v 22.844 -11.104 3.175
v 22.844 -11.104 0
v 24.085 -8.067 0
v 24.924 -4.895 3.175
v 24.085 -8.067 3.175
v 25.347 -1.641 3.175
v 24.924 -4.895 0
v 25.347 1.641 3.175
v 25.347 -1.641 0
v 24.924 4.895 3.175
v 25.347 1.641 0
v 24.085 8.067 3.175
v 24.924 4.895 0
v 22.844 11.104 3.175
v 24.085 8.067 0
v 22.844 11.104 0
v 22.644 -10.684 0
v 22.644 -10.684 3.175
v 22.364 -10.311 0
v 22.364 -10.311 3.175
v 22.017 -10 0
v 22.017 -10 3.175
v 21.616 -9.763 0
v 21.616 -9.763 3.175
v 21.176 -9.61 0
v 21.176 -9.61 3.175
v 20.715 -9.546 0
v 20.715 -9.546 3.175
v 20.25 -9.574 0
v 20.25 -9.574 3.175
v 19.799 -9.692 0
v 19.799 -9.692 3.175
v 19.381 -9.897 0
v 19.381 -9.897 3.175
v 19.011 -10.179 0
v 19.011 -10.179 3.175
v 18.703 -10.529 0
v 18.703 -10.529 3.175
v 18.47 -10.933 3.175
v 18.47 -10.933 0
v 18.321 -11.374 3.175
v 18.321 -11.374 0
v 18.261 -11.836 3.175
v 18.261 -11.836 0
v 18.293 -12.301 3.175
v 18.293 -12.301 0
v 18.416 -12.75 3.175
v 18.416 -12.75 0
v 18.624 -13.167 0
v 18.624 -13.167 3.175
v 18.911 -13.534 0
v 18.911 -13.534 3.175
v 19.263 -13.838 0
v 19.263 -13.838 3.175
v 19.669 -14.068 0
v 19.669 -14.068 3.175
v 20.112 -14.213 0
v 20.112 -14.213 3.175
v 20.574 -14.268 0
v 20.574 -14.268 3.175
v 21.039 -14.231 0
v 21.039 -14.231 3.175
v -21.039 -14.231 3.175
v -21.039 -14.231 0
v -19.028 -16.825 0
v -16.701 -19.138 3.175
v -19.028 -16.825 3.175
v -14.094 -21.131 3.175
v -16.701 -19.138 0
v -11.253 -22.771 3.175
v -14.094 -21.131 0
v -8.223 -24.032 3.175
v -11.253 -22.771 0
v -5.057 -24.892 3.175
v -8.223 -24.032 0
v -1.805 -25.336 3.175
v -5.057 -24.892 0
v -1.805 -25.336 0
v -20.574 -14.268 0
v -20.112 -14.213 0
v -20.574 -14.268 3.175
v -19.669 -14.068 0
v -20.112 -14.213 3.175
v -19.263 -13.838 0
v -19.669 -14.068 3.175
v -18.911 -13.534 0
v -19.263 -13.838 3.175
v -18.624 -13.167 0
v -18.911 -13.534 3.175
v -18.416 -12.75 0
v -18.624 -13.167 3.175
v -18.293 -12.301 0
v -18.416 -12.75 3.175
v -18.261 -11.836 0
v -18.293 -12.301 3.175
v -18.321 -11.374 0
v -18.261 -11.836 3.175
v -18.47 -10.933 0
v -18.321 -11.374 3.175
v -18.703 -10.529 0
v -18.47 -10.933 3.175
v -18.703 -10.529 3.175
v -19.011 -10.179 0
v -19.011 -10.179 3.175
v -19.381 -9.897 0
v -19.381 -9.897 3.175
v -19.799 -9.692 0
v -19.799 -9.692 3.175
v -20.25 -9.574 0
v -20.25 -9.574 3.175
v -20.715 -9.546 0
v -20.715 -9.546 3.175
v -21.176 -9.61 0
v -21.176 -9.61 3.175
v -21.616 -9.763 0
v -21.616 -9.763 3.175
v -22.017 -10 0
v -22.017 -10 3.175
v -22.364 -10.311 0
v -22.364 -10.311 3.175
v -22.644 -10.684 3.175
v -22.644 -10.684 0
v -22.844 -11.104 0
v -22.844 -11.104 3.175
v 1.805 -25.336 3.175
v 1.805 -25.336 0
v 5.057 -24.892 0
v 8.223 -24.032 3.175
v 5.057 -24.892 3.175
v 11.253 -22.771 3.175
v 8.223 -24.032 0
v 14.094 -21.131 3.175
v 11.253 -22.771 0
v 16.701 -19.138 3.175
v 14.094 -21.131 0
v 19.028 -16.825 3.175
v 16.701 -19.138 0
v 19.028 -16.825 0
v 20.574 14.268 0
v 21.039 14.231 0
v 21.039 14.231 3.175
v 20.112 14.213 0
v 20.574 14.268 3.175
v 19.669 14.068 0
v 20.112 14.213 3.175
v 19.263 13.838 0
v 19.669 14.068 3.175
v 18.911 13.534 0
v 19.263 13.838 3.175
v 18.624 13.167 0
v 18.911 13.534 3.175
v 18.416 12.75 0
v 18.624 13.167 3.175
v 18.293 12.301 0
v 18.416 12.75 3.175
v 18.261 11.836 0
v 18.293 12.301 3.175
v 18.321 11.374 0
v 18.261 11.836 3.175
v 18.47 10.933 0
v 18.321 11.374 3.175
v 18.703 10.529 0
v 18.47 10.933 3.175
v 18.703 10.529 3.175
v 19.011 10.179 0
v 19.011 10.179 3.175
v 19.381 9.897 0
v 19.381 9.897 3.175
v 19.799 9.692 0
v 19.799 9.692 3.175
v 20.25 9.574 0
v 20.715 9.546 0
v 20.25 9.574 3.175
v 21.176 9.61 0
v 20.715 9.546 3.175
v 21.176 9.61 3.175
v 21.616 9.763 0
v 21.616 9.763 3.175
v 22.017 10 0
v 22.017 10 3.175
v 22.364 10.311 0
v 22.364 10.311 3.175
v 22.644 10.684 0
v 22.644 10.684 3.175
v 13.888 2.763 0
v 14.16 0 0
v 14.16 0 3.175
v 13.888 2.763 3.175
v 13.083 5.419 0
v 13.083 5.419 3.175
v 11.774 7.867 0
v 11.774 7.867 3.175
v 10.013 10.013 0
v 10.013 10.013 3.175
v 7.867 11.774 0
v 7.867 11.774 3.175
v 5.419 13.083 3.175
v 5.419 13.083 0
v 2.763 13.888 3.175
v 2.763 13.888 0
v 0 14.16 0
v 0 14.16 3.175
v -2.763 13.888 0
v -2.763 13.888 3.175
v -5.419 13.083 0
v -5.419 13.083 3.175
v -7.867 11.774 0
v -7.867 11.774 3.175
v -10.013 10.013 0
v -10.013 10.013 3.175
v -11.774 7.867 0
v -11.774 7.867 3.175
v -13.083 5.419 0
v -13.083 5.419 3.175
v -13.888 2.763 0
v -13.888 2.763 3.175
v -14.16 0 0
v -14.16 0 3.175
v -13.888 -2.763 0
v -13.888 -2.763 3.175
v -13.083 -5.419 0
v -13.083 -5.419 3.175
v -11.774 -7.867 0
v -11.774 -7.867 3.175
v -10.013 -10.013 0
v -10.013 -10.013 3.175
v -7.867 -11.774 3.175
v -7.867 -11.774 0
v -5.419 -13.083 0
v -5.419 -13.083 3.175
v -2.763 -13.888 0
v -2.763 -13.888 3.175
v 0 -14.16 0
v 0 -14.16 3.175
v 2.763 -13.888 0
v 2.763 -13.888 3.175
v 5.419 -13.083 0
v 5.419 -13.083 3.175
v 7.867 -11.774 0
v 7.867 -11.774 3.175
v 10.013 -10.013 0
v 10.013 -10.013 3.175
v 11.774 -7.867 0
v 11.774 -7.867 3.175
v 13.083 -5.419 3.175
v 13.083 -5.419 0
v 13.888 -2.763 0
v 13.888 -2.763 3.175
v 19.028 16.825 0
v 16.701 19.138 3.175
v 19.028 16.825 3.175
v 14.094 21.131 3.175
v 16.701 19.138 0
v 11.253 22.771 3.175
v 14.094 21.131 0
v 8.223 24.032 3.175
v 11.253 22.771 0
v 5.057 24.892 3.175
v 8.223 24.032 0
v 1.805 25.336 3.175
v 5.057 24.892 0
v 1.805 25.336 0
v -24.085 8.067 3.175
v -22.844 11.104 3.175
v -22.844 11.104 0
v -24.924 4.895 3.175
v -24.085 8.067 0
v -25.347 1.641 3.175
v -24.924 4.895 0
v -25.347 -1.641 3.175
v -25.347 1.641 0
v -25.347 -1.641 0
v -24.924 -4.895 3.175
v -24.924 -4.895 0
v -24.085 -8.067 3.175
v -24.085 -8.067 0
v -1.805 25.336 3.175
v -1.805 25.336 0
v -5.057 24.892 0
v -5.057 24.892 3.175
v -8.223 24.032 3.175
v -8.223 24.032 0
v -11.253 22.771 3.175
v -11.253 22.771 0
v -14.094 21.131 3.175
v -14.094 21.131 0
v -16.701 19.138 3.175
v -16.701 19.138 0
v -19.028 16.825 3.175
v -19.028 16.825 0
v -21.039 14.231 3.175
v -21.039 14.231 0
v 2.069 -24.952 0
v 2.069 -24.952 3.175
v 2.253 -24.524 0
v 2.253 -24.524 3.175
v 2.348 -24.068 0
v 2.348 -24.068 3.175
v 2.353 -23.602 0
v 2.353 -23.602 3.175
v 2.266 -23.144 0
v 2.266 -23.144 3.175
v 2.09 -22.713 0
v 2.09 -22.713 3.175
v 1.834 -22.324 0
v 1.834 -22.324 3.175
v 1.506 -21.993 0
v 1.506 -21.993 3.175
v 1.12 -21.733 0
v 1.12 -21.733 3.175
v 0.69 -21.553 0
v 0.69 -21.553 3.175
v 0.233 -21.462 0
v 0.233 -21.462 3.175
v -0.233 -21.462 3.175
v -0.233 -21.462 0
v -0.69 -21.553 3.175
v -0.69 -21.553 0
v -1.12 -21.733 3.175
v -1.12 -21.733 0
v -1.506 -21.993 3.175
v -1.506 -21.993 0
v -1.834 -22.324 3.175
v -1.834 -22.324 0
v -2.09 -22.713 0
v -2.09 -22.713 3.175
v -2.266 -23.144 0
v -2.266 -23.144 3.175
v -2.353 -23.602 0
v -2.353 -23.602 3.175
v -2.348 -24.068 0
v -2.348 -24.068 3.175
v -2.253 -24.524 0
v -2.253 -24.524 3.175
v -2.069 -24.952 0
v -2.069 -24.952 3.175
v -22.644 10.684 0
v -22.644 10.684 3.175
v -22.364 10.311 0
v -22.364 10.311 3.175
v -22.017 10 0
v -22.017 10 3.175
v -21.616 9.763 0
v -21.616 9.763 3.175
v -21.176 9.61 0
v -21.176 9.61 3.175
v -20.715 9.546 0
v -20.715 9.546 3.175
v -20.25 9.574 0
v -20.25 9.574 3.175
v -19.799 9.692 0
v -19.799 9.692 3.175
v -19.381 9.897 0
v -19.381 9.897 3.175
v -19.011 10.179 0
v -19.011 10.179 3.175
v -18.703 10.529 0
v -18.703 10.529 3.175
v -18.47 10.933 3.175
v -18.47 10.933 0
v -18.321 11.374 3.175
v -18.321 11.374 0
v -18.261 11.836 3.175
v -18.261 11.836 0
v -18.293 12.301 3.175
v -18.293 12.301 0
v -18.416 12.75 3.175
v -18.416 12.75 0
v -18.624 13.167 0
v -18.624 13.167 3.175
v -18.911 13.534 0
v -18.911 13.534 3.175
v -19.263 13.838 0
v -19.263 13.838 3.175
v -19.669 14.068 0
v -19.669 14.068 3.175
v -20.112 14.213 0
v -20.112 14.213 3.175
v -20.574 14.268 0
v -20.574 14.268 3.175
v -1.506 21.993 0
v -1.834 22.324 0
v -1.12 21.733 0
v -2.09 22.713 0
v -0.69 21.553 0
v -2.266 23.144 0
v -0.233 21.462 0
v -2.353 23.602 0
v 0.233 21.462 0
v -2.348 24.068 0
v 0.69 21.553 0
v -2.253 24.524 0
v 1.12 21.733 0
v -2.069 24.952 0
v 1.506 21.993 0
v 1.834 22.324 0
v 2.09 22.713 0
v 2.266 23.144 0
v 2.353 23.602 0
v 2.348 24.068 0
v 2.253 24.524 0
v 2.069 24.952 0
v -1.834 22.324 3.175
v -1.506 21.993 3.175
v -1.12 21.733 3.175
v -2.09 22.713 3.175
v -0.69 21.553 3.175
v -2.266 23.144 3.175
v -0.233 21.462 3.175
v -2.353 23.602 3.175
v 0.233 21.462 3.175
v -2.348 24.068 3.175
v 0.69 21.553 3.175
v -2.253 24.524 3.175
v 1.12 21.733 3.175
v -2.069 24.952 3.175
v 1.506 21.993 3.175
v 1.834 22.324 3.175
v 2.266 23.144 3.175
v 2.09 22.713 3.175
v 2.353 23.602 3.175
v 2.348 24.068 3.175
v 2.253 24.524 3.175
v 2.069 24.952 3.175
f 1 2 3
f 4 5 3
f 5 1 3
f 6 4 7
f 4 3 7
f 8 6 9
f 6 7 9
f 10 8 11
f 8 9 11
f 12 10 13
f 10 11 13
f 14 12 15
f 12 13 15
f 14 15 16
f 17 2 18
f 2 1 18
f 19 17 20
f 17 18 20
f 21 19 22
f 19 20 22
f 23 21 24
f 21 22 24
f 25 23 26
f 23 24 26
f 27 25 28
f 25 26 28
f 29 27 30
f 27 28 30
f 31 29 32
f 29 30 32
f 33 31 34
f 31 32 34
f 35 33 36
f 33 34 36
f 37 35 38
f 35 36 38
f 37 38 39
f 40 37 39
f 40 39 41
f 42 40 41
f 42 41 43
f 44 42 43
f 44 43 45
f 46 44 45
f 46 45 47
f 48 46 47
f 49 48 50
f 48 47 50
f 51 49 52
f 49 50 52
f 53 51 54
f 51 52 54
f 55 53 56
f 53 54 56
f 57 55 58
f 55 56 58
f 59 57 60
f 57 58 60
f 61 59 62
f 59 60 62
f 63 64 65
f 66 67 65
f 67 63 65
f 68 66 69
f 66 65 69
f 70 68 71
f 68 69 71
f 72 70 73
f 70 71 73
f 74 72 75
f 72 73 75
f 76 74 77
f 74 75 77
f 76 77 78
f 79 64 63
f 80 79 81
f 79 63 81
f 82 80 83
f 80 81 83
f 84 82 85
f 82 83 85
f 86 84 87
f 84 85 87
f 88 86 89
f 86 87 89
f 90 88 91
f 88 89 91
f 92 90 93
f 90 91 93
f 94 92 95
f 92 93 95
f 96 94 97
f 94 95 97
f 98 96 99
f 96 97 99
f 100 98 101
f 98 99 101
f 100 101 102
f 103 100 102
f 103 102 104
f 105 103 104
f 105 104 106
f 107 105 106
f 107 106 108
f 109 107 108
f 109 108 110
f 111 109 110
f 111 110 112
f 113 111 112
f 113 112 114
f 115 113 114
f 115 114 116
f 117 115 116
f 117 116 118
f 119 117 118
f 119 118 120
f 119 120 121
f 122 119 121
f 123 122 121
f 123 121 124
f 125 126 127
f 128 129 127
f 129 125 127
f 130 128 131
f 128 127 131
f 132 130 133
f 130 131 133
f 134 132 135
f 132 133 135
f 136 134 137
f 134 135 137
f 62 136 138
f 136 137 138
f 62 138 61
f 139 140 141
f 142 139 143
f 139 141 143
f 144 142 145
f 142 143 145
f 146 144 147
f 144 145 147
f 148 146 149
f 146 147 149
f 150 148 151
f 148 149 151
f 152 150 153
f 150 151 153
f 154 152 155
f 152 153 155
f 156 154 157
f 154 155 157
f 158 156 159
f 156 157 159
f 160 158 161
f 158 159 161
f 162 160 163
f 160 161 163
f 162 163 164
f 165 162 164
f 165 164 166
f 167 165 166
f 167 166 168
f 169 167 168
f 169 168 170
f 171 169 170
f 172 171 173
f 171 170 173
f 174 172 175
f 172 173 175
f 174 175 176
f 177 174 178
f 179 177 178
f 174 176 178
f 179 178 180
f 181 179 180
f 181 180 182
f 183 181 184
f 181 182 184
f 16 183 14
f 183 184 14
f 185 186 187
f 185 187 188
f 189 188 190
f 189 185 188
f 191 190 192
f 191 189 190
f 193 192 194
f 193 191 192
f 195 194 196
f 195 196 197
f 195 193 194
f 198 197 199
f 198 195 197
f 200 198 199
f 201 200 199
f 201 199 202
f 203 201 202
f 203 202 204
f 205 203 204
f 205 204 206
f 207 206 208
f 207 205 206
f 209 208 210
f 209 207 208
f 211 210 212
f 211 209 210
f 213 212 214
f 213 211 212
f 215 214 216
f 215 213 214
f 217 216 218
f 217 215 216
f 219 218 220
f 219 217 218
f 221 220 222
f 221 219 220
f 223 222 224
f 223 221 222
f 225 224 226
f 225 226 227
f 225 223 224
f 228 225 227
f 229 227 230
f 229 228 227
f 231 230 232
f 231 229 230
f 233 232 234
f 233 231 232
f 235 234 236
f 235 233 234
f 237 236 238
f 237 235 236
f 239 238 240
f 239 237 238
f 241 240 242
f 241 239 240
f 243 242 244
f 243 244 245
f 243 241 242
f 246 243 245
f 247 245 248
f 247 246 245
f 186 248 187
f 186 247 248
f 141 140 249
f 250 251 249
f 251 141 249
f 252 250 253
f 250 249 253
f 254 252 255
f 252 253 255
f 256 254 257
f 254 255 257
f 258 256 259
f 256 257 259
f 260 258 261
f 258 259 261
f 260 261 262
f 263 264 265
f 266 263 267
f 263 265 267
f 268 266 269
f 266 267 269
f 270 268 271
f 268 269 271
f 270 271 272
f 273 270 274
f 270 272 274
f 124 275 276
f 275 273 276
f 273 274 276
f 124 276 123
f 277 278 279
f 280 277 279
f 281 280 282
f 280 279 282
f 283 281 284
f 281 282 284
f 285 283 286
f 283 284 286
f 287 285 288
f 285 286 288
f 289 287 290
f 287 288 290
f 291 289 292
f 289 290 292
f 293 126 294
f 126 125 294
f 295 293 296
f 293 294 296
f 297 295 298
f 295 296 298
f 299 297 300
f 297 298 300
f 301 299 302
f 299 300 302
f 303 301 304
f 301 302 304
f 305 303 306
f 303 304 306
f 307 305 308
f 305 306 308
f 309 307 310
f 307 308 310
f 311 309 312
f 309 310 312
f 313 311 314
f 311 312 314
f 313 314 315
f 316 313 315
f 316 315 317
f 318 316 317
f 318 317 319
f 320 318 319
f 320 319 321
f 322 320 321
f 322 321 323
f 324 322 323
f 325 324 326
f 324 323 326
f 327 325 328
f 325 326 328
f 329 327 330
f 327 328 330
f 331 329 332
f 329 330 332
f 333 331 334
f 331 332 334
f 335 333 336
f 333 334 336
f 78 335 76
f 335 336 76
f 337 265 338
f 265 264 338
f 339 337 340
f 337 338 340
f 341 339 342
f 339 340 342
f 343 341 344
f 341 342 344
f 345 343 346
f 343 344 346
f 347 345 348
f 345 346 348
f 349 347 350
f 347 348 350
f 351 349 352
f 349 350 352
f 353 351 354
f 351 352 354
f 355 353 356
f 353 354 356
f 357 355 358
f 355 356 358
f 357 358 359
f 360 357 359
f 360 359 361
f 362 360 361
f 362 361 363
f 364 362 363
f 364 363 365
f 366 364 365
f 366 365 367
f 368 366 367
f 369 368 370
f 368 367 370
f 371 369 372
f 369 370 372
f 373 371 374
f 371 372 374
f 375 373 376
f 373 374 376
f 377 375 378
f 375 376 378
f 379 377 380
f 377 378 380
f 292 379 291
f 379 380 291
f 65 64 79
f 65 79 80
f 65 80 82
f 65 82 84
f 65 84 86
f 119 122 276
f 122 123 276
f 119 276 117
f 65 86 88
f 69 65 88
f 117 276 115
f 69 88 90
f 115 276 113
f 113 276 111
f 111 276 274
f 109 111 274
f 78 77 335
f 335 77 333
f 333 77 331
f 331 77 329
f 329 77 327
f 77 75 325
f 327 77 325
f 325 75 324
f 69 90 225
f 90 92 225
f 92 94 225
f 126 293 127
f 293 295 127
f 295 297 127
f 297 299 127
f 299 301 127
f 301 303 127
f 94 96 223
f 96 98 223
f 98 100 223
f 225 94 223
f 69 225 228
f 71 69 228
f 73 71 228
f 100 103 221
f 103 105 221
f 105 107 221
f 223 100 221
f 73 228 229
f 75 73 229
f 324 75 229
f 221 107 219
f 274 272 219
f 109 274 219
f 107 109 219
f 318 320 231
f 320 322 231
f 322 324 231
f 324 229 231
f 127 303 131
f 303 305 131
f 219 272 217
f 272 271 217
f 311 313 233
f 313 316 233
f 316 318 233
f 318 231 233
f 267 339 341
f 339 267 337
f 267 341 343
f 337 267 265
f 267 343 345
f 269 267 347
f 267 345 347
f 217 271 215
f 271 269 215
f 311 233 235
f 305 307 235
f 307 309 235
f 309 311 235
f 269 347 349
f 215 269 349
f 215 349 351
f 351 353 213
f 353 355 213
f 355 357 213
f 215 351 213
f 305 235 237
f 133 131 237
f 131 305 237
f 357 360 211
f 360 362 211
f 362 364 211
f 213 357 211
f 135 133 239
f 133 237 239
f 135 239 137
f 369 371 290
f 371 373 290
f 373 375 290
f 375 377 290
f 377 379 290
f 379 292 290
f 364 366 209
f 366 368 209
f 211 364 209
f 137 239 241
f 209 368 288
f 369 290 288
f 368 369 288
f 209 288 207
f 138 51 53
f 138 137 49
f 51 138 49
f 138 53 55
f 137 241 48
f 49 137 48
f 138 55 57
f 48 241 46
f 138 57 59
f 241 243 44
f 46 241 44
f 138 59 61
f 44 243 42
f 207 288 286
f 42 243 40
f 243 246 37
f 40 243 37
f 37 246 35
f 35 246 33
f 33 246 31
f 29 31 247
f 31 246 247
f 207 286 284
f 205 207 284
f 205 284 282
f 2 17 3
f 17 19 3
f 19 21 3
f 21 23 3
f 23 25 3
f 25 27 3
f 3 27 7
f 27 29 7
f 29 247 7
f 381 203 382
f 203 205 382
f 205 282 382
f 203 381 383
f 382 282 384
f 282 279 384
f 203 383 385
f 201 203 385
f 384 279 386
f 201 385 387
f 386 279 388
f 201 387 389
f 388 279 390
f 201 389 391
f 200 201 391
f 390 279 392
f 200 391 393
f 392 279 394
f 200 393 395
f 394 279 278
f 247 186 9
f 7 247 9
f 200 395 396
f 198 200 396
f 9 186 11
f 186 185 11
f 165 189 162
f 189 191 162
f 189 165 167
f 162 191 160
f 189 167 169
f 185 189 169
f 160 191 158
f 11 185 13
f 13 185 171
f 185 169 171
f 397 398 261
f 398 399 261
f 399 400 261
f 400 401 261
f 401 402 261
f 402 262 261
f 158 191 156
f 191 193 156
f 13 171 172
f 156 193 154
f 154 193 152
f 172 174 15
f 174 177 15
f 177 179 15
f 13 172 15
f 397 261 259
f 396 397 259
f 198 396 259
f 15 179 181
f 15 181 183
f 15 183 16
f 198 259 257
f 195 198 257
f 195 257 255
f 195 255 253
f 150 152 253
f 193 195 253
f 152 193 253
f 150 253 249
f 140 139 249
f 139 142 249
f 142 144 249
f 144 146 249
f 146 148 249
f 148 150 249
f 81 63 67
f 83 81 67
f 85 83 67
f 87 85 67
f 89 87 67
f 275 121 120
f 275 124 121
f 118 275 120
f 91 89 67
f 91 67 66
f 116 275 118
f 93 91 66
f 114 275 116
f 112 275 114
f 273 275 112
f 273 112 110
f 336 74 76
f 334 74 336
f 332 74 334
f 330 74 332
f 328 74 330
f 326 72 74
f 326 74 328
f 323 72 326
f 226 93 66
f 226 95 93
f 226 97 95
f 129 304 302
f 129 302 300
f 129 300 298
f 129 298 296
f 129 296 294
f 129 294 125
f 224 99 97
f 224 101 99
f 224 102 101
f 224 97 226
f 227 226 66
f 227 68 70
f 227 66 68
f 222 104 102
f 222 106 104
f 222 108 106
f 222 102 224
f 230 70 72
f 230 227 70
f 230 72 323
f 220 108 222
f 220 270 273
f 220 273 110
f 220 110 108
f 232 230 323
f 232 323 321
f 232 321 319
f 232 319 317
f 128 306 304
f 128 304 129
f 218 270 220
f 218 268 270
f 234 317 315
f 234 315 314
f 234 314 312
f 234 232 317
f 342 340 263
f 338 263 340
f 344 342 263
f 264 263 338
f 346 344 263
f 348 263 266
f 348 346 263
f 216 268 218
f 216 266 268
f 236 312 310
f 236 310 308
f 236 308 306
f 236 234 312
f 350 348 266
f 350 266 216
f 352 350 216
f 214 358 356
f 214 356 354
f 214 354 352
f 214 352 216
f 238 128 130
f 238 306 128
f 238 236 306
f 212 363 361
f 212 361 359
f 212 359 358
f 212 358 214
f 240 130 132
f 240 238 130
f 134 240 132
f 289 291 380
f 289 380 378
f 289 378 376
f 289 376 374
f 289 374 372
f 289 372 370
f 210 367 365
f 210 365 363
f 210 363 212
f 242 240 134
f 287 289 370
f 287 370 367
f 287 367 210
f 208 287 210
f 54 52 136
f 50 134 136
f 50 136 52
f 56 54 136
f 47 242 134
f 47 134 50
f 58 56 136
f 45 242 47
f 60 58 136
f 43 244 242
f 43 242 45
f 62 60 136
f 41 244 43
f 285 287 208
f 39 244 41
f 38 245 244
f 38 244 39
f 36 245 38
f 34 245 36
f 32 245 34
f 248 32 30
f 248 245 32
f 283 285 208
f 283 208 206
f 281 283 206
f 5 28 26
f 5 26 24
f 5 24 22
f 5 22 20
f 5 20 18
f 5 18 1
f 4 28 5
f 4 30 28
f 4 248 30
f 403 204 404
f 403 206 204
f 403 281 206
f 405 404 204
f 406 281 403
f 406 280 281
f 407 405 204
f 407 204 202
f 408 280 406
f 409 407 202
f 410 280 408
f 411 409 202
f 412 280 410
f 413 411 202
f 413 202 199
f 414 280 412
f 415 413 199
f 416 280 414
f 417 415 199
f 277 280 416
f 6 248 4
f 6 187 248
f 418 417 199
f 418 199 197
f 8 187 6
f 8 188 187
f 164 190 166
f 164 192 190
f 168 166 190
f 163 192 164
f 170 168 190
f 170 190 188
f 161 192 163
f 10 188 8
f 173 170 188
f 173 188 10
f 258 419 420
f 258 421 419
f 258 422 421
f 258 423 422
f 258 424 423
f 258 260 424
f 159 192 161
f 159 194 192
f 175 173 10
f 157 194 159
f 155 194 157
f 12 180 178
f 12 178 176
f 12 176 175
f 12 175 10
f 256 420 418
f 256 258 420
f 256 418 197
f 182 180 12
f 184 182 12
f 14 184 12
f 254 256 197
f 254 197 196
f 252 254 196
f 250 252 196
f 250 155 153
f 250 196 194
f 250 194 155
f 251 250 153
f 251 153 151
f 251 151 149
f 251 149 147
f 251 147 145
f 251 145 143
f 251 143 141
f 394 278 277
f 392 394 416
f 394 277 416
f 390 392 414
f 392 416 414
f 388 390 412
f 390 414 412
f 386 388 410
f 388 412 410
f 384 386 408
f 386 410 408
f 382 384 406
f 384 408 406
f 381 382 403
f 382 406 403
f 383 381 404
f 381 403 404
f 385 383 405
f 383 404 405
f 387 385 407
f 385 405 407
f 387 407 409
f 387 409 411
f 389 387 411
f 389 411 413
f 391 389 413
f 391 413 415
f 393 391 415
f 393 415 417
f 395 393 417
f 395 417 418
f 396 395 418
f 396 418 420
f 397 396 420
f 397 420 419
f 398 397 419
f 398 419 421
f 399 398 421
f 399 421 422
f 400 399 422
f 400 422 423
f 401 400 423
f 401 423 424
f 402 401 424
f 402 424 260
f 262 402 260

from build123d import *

# Parameters (mm, degrees)
F0_R            = 25.4
F0_R_2          = 14.1605
F1_DEPTH        = 3.175
F2_R            = 2.3622
F3_DEPTH        = 3.176
F3_COPIES_COUNT = 6


# Not quite as in the source:
# - a pattern or mirror of a feature is missing from the dataset's text; its kind, count and spacing are read off the source's solid


with BuildPart() as f1:
    # F0 (on Top) → F1 (new body)
    with BuildSketch(Plane.XY):
        Circle(F0_R)
        Circle(F0_R_2, mode=Mode.SUBTRACT)
    extrude(amount=F1_DEPTH)

    # F2 (on face) → F3 (cut, through all)
    with BuildSketch(Plane.XY.offset(3.175)):
        with Locations((0, 23.8125)):
            Circle(F2_R)
    f3 = extrude(amount=-F3_DEPTH, mode=Mode.SUBTRACT)

    # F3_copies: F3 ×6 about axis
    f3_copies_axis = Axis((0, 0, 0), (0, 0, 1))
    for i in range(1, F3_COPIES_COUNT):
        add(f3.rotate(f3_copies_axis, i * 360 / F3_COPIES_COUNT), mode=Mode.SUBTRACT)


solid = f1.part
